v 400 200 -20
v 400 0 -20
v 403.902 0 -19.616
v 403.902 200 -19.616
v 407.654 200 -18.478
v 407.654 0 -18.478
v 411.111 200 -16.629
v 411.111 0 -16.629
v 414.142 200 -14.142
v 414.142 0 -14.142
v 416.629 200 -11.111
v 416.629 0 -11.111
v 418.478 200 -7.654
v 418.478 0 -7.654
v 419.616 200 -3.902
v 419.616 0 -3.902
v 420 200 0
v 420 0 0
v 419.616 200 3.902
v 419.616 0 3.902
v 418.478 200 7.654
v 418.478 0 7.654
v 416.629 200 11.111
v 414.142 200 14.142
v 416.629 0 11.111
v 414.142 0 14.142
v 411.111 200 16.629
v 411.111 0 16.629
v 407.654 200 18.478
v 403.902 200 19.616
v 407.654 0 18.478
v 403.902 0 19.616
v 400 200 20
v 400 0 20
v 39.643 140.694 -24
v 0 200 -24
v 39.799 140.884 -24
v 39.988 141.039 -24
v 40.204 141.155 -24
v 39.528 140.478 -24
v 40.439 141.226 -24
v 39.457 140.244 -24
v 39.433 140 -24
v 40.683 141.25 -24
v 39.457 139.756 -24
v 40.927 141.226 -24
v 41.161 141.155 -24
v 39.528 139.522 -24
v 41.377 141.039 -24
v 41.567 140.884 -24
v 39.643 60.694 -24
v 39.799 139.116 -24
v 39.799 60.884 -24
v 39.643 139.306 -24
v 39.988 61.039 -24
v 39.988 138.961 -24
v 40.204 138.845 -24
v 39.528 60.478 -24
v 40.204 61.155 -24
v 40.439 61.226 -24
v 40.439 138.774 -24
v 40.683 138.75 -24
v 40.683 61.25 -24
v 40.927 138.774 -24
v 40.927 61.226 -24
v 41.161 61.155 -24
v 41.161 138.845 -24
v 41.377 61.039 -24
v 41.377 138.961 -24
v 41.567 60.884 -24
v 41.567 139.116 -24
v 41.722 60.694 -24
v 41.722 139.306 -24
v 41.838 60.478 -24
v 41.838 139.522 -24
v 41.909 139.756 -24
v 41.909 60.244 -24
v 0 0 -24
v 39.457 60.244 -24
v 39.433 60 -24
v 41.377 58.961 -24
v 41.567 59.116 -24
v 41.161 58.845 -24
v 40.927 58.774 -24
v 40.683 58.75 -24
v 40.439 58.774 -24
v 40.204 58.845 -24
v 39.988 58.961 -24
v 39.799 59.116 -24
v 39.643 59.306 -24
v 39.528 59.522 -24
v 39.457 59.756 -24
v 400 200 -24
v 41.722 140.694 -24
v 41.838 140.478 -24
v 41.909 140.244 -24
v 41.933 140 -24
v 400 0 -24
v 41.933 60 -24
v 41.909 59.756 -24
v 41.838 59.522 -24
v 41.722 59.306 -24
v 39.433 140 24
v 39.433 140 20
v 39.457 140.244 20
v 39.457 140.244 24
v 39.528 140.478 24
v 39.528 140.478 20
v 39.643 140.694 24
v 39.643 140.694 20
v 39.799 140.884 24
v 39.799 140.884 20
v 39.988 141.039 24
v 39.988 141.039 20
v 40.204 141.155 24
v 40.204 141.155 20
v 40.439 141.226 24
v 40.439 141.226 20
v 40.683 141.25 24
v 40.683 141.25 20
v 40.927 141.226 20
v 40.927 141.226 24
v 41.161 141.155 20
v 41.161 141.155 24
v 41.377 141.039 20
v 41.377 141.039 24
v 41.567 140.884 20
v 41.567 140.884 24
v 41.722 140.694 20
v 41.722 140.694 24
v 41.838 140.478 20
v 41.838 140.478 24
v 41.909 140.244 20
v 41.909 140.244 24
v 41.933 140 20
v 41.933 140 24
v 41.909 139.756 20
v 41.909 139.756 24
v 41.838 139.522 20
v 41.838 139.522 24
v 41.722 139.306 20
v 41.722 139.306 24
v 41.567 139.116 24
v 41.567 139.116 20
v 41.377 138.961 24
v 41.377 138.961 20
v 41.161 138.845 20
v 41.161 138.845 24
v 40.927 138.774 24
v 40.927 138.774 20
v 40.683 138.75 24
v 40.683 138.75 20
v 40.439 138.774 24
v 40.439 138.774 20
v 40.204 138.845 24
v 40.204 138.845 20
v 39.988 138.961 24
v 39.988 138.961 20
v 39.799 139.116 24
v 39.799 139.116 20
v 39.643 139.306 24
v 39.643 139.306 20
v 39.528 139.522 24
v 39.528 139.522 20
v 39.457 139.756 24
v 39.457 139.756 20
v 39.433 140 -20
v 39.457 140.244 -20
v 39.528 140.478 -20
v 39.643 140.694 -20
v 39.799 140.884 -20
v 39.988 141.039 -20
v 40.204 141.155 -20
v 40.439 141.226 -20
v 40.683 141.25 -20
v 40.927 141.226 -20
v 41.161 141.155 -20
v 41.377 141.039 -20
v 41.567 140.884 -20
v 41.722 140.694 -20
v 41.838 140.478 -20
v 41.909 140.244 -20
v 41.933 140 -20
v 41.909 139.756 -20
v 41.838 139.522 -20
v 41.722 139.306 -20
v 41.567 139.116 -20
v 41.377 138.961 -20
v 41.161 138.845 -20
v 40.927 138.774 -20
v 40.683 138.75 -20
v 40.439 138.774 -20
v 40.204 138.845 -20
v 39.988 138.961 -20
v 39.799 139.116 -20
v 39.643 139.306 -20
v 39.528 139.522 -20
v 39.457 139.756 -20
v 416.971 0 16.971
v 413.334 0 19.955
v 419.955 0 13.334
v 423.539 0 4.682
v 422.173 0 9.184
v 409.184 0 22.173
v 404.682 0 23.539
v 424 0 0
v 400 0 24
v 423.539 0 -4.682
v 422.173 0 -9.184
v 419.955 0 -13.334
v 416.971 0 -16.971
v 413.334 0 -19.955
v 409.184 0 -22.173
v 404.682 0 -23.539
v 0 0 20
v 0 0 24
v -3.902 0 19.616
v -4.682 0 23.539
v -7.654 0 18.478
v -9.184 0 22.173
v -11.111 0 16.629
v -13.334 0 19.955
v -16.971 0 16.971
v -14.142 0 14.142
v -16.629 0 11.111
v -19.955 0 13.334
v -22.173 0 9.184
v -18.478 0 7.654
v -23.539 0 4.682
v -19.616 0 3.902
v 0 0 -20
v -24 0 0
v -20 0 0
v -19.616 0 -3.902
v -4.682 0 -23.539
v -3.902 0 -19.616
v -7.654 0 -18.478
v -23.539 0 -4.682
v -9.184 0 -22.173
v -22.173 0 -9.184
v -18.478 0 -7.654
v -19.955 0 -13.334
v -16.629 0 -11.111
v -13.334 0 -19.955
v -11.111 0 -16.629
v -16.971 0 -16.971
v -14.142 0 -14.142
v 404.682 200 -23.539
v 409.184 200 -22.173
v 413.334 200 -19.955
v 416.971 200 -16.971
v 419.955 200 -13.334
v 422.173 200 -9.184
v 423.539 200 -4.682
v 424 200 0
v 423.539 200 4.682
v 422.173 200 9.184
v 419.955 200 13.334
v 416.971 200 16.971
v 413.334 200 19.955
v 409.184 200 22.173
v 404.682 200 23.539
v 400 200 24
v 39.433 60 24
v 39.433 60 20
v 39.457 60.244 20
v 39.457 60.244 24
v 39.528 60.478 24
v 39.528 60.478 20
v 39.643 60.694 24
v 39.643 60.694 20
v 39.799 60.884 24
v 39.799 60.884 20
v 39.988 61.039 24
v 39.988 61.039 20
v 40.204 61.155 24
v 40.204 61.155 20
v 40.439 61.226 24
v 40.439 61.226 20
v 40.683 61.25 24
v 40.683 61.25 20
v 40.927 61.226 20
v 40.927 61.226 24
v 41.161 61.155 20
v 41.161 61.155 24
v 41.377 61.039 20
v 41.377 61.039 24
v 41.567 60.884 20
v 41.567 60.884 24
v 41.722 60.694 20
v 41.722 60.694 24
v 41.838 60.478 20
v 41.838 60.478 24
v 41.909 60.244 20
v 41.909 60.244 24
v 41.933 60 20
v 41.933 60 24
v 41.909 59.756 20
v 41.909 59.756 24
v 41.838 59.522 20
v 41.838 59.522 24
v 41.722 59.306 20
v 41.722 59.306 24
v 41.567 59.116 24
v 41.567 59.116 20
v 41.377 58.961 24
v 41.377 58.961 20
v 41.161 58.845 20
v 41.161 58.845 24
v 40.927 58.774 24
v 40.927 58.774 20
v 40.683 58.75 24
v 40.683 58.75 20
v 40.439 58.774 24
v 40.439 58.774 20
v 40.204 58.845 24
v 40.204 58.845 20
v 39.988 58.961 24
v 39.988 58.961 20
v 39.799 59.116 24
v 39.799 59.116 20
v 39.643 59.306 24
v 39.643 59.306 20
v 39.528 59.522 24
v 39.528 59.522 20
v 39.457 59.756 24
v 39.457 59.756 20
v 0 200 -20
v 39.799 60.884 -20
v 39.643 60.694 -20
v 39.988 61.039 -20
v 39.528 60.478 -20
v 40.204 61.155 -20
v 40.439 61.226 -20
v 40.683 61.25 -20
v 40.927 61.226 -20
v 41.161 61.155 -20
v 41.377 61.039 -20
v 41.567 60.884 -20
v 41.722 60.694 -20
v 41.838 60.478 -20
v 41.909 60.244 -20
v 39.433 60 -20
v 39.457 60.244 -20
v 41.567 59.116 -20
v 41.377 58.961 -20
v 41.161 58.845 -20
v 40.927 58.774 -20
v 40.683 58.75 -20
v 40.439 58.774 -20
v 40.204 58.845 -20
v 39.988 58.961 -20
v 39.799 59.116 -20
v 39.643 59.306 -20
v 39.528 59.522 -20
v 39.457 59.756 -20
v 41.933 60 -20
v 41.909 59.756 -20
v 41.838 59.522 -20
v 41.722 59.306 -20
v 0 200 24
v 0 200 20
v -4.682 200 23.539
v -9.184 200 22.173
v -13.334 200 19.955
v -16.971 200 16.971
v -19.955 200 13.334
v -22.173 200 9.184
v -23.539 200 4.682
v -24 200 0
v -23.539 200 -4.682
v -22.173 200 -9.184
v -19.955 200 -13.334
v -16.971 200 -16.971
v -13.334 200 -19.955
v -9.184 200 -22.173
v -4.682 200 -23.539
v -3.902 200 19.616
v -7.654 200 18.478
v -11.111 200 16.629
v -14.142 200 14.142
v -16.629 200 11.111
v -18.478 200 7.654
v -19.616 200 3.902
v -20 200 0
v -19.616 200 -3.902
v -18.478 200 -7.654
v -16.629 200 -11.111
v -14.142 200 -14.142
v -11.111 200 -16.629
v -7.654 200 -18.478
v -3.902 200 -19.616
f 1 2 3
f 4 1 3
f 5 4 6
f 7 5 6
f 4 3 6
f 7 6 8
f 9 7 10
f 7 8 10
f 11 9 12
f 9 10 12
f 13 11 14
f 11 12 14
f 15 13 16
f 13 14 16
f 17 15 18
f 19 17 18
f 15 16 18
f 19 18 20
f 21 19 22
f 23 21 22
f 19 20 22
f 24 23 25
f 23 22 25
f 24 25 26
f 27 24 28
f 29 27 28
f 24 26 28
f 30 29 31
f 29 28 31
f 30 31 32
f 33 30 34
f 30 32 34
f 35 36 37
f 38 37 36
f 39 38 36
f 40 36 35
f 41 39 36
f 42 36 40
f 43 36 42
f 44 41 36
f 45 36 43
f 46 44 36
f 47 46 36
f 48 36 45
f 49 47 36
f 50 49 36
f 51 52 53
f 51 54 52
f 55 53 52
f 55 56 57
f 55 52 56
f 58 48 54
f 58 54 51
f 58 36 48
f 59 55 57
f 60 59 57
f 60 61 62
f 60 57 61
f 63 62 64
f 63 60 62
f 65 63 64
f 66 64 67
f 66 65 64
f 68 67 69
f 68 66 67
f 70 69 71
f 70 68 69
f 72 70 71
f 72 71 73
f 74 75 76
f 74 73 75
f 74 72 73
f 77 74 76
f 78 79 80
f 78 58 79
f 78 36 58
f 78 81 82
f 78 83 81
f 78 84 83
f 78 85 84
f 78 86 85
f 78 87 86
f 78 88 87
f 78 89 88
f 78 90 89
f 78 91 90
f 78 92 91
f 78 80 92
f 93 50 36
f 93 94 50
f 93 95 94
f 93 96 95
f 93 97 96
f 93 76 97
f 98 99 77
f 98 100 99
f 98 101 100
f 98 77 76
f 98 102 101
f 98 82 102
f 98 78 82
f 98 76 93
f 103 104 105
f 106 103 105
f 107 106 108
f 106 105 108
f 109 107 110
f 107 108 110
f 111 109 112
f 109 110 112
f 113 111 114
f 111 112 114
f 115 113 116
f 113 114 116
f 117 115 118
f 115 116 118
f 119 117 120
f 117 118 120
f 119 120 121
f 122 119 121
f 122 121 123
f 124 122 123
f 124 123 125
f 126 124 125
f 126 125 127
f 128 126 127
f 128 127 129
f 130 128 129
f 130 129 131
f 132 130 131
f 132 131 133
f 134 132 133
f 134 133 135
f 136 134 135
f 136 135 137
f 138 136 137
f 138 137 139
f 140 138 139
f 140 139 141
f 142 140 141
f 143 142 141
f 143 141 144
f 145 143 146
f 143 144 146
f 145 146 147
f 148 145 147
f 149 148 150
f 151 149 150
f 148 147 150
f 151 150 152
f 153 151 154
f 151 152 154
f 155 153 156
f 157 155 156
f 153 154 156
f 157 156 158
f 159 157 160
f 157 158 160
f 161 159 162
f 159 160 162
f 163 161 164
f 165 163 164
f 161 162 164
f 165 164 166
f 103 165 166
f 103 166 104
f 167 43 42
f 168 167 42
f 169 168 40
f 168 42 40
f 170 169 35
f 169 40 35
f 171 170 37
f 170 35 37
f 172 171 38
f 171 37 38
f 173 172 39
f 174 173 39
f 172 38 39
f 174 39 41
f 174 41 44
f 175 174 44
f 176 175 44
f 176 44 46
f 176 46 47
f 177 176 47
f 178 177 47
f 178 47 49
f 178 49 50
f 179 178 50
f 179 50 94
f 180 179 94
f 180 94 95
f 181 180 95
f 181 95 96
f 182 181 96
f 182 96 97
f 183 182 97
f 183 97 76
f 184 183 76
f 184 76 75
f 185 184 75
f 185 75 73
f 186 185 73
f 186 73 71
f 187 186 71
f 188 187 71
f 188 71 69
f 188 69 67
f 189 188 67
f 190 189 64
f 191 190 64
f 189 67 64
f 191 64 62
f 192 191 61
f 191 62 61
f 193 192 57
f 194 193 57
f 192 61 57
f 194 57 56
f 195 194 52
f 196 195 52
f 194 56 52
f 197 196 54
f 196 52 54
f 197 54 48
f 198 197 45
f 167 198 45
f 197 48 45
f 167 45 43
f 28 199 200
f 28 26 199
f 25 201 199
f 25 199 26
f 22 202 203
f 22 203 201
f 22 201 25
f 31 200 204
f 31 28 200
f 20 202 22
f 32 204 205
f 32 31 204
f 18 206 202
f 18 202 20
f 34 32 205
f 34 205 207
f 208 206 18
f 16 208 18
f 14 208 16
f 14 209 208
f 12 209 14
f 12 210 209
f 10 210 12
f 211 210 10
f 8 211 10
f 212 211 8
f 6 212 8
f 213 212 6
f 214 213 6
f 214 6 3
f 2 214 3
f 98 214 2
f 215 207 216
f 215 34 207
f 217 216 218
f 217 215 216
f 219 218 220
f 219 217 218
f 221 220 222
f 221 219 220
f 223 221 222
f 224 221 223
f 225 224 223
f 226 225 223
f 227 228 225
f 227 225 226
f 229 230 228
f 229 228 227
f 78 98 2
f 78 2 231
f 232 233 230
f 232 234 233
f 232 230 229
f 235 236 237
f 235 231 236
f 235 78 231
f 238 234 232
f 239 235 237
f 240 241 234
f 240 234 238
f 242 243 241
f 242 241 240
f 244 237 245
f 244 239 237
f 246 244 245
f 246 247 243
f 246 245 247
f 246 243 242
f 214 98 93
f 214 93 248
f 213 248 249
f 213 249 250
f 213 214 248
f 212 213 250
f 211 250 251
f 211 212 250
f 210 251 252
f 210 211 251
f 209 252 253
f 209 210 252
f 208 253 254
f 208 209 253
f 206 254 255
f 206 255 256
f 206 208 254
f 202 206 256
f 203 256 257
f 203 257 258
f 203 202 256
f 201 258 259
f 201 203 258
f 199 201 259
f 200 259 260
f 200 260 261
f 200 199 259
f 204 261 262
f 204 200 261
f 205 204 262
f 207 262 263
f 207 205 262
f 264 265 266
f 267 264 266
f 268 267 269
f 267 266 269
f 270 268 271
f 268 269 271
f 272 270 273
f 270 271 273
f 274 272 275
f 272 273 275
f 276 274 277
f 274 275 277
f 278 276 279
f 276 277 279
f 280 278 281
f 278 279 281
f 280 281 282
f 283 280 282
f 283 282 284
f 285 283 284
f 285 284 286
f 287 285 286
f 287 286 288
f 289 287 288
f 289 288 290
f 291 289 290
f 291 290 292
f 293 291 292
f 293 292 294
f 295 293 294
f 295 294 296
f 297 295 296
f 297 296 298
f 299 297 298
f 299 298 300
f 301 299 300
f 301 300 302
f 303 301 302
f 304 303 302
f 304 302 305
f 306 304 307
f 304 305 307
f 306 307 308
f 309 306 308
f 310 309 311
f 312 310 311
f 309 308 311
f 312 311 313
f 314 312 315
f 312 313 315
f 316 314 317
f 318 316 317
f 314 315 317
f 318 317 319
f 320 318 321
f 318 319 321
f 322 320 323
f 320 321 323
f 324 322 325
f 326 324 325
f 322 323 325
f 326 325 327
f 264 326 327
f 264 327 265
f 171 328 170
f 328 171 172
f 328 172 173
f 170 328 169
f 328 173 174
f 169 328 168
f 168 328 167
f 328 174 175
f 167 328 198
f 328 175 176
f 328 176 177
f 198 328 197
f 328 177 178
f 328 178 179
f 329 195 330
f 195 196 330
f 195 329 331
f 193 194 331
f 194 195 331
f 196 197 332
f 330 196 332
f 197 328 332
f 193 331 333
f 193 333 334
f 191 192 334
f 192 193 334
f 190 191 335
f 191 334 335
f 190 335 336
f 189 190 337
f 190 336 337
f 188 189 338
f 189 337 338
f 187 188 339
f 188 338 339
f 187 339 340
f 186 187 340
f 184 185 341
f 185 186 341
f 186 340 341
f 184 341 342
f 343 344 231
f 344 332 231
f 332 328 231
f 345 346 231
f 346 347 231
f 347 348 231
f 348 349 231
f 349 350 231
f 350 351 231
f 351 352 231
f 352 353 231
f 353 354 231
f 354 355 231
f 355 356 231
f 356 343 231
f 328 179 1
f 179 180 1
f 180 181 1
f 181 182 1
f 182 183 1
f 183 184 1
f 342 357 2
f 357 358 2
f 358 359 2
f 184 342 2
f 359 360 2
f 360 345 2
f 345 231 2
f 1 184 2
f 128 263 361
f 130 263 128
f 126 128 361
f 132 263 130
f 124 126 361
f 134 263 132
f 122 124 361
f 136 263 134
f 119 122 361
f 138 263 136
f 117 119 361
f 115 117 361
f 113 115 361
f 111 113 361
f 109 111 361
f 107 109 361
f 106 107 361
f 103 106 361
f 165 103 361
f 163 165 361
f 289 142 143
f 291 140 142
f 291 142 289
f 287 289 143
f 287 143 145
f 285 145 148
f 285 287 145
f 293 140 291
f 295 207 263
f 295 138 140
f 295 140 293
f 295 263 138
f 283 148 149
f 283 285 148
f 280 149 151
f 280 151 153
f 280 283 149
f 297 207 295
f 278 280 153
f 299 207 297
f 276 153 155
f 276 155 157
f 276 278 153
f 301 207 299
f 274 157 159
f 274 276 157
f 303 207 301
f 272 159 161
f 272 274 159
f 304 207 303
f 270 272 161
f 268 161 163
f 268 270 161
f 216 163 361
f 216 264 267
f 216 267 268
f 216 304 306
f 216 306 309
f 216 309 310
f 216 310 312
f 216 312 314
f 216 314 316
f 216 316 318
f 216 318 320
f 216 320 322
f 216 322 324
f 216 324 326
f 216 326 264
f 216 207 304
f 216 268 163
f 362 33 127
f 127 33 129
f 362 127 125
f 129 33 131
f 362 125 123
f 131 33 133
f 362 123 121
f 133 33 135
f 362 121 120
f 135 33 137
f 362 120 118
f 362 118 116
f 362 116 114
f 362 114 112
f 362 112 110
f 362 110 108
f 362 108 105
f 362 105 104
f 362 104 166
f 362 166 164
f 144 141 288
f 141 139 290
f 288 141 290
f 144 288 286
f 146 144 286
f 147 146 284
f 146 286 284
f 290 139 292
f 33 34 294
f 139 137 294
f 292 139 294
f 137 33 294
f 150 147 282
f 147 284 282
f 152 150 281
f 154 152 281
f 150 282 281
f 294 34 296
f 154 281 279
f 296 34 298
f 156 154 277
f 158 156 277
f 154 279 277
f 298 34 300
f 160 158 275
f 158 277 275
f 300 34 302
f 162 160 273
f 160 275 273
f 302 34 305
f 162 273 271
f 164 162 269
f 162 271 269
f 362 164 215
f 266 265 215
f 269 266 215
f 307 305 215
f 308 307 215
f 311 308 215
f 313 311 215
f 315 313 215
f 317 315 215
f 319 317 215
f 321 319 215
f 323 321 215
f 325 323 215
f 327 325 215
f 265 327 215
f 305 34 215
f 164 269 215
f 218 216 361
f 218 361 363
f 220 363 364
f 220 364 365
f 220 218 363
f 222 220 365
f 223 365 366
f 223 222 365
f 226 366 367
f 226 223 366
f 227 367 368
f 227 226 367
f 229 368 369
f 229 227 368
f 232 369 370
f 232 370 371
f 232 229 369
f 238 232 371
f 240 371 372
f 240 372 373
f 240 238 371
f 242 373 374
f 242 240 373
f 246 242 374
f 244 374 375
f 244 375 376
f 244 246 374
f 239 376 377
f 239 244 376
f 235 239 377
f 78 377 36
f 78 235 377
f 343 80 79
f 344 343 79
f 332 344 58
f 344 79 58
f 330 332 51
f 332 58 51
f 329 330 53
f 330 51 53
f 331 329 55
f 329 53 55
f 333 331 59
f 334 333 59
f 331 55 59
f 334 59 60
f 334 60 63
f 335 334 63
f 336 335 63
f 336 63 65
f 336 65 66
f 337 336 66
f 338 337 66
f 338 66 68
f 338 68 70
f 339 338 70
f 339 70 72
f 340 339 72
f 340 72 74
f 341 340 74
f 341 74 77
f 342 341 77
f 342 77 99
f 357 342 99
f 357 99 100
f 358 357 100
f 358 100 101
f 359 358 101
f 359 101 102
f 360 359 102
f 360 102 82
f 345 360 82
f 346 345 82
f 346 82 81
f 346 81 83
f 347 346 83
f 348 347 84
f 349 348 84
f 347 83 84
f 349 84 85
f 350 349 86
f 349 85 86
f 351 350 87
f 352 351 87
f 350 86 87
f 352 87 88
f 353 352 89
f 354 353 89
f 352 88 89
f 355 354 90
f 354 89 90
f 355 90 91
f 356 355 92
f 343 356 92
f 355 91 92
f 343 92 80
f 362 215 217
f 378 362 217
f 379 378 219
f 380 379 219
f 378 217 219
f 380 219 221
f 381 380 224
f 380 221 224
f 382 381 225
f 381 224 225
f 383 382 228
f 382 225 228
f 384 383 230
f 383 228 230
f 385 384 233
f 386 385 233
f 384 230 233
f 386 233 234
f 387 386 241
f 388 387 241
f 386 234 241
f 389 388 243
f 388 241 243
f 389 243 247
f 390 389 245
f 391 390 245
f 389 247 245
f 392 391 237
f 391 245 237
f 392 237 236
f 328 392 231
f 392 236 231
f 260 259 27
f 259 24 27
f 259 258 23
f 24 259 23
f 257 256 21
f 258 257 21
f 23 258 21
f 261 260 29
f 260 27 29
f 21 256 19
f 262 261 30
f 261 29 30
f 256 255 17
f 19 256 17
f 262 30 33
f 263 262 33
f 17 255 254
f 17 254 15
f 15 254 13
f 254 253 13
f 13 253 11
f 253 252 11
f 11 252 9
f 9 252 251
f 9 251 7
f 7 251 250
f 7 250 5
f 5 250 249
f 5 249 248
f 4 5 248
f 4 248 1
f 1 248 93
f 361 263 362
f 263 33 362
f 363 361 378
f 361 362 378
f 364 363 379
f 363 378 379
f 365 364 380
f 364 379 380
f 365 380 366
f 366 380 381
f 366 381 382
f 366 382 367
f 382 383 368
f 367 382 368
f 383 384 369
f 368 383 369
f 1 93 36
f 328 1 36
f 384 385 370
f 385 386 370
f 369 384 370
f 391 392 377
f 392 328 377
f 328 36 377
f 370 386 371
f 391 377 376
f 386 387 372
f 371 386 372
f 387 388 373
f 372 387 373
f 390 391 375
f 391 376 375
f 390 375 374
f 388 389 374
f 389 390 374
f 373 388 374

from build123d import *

# Parameters (mm, degrees)
EXTRUDE_1_DEPTH    = 200
HOLE_WIZARD_M3_1_D = 2.5


with BuildPart() as part:
    # 草图1 → 拉伸-薄壁1 (new body)
    with BuildSketch(Plane(origin=(0, 0, 0), x_dir=(1, 0, 0), z_dir=(0, 1, 0))):
        with BuildLine():
            Line((400, -24), (0, -24))
            ThreePointArc((0, -24), (-24, 0), (0, 24))
            Line((0, 24), (400, 24))
            ThreePointArc((400, 24), (424, 0), (400, -24))
        make_face()
        with BuildLine():
            Line((400, -20), (0, -20))
            ThreePointArc((0, -20), (-20, 0), (0, 20))
            Line((0, 20), (400, 20))
            ThreePointArc((400, 20), (420, 0), (400, -20))
        make_face(mode=Mode.SUBTRACT)
    extrude(amount=EXTRUDE_1_DEPTH)

    # M3 螺纹孔1 (through all)
    with Locations(Plane.XY.offset(24)):
        with Locations((40.682677542, 140), (40.682677542, 60)):
            Hole(HOLE_WIZARD_M3_1_D / 2)


solid = part.part
